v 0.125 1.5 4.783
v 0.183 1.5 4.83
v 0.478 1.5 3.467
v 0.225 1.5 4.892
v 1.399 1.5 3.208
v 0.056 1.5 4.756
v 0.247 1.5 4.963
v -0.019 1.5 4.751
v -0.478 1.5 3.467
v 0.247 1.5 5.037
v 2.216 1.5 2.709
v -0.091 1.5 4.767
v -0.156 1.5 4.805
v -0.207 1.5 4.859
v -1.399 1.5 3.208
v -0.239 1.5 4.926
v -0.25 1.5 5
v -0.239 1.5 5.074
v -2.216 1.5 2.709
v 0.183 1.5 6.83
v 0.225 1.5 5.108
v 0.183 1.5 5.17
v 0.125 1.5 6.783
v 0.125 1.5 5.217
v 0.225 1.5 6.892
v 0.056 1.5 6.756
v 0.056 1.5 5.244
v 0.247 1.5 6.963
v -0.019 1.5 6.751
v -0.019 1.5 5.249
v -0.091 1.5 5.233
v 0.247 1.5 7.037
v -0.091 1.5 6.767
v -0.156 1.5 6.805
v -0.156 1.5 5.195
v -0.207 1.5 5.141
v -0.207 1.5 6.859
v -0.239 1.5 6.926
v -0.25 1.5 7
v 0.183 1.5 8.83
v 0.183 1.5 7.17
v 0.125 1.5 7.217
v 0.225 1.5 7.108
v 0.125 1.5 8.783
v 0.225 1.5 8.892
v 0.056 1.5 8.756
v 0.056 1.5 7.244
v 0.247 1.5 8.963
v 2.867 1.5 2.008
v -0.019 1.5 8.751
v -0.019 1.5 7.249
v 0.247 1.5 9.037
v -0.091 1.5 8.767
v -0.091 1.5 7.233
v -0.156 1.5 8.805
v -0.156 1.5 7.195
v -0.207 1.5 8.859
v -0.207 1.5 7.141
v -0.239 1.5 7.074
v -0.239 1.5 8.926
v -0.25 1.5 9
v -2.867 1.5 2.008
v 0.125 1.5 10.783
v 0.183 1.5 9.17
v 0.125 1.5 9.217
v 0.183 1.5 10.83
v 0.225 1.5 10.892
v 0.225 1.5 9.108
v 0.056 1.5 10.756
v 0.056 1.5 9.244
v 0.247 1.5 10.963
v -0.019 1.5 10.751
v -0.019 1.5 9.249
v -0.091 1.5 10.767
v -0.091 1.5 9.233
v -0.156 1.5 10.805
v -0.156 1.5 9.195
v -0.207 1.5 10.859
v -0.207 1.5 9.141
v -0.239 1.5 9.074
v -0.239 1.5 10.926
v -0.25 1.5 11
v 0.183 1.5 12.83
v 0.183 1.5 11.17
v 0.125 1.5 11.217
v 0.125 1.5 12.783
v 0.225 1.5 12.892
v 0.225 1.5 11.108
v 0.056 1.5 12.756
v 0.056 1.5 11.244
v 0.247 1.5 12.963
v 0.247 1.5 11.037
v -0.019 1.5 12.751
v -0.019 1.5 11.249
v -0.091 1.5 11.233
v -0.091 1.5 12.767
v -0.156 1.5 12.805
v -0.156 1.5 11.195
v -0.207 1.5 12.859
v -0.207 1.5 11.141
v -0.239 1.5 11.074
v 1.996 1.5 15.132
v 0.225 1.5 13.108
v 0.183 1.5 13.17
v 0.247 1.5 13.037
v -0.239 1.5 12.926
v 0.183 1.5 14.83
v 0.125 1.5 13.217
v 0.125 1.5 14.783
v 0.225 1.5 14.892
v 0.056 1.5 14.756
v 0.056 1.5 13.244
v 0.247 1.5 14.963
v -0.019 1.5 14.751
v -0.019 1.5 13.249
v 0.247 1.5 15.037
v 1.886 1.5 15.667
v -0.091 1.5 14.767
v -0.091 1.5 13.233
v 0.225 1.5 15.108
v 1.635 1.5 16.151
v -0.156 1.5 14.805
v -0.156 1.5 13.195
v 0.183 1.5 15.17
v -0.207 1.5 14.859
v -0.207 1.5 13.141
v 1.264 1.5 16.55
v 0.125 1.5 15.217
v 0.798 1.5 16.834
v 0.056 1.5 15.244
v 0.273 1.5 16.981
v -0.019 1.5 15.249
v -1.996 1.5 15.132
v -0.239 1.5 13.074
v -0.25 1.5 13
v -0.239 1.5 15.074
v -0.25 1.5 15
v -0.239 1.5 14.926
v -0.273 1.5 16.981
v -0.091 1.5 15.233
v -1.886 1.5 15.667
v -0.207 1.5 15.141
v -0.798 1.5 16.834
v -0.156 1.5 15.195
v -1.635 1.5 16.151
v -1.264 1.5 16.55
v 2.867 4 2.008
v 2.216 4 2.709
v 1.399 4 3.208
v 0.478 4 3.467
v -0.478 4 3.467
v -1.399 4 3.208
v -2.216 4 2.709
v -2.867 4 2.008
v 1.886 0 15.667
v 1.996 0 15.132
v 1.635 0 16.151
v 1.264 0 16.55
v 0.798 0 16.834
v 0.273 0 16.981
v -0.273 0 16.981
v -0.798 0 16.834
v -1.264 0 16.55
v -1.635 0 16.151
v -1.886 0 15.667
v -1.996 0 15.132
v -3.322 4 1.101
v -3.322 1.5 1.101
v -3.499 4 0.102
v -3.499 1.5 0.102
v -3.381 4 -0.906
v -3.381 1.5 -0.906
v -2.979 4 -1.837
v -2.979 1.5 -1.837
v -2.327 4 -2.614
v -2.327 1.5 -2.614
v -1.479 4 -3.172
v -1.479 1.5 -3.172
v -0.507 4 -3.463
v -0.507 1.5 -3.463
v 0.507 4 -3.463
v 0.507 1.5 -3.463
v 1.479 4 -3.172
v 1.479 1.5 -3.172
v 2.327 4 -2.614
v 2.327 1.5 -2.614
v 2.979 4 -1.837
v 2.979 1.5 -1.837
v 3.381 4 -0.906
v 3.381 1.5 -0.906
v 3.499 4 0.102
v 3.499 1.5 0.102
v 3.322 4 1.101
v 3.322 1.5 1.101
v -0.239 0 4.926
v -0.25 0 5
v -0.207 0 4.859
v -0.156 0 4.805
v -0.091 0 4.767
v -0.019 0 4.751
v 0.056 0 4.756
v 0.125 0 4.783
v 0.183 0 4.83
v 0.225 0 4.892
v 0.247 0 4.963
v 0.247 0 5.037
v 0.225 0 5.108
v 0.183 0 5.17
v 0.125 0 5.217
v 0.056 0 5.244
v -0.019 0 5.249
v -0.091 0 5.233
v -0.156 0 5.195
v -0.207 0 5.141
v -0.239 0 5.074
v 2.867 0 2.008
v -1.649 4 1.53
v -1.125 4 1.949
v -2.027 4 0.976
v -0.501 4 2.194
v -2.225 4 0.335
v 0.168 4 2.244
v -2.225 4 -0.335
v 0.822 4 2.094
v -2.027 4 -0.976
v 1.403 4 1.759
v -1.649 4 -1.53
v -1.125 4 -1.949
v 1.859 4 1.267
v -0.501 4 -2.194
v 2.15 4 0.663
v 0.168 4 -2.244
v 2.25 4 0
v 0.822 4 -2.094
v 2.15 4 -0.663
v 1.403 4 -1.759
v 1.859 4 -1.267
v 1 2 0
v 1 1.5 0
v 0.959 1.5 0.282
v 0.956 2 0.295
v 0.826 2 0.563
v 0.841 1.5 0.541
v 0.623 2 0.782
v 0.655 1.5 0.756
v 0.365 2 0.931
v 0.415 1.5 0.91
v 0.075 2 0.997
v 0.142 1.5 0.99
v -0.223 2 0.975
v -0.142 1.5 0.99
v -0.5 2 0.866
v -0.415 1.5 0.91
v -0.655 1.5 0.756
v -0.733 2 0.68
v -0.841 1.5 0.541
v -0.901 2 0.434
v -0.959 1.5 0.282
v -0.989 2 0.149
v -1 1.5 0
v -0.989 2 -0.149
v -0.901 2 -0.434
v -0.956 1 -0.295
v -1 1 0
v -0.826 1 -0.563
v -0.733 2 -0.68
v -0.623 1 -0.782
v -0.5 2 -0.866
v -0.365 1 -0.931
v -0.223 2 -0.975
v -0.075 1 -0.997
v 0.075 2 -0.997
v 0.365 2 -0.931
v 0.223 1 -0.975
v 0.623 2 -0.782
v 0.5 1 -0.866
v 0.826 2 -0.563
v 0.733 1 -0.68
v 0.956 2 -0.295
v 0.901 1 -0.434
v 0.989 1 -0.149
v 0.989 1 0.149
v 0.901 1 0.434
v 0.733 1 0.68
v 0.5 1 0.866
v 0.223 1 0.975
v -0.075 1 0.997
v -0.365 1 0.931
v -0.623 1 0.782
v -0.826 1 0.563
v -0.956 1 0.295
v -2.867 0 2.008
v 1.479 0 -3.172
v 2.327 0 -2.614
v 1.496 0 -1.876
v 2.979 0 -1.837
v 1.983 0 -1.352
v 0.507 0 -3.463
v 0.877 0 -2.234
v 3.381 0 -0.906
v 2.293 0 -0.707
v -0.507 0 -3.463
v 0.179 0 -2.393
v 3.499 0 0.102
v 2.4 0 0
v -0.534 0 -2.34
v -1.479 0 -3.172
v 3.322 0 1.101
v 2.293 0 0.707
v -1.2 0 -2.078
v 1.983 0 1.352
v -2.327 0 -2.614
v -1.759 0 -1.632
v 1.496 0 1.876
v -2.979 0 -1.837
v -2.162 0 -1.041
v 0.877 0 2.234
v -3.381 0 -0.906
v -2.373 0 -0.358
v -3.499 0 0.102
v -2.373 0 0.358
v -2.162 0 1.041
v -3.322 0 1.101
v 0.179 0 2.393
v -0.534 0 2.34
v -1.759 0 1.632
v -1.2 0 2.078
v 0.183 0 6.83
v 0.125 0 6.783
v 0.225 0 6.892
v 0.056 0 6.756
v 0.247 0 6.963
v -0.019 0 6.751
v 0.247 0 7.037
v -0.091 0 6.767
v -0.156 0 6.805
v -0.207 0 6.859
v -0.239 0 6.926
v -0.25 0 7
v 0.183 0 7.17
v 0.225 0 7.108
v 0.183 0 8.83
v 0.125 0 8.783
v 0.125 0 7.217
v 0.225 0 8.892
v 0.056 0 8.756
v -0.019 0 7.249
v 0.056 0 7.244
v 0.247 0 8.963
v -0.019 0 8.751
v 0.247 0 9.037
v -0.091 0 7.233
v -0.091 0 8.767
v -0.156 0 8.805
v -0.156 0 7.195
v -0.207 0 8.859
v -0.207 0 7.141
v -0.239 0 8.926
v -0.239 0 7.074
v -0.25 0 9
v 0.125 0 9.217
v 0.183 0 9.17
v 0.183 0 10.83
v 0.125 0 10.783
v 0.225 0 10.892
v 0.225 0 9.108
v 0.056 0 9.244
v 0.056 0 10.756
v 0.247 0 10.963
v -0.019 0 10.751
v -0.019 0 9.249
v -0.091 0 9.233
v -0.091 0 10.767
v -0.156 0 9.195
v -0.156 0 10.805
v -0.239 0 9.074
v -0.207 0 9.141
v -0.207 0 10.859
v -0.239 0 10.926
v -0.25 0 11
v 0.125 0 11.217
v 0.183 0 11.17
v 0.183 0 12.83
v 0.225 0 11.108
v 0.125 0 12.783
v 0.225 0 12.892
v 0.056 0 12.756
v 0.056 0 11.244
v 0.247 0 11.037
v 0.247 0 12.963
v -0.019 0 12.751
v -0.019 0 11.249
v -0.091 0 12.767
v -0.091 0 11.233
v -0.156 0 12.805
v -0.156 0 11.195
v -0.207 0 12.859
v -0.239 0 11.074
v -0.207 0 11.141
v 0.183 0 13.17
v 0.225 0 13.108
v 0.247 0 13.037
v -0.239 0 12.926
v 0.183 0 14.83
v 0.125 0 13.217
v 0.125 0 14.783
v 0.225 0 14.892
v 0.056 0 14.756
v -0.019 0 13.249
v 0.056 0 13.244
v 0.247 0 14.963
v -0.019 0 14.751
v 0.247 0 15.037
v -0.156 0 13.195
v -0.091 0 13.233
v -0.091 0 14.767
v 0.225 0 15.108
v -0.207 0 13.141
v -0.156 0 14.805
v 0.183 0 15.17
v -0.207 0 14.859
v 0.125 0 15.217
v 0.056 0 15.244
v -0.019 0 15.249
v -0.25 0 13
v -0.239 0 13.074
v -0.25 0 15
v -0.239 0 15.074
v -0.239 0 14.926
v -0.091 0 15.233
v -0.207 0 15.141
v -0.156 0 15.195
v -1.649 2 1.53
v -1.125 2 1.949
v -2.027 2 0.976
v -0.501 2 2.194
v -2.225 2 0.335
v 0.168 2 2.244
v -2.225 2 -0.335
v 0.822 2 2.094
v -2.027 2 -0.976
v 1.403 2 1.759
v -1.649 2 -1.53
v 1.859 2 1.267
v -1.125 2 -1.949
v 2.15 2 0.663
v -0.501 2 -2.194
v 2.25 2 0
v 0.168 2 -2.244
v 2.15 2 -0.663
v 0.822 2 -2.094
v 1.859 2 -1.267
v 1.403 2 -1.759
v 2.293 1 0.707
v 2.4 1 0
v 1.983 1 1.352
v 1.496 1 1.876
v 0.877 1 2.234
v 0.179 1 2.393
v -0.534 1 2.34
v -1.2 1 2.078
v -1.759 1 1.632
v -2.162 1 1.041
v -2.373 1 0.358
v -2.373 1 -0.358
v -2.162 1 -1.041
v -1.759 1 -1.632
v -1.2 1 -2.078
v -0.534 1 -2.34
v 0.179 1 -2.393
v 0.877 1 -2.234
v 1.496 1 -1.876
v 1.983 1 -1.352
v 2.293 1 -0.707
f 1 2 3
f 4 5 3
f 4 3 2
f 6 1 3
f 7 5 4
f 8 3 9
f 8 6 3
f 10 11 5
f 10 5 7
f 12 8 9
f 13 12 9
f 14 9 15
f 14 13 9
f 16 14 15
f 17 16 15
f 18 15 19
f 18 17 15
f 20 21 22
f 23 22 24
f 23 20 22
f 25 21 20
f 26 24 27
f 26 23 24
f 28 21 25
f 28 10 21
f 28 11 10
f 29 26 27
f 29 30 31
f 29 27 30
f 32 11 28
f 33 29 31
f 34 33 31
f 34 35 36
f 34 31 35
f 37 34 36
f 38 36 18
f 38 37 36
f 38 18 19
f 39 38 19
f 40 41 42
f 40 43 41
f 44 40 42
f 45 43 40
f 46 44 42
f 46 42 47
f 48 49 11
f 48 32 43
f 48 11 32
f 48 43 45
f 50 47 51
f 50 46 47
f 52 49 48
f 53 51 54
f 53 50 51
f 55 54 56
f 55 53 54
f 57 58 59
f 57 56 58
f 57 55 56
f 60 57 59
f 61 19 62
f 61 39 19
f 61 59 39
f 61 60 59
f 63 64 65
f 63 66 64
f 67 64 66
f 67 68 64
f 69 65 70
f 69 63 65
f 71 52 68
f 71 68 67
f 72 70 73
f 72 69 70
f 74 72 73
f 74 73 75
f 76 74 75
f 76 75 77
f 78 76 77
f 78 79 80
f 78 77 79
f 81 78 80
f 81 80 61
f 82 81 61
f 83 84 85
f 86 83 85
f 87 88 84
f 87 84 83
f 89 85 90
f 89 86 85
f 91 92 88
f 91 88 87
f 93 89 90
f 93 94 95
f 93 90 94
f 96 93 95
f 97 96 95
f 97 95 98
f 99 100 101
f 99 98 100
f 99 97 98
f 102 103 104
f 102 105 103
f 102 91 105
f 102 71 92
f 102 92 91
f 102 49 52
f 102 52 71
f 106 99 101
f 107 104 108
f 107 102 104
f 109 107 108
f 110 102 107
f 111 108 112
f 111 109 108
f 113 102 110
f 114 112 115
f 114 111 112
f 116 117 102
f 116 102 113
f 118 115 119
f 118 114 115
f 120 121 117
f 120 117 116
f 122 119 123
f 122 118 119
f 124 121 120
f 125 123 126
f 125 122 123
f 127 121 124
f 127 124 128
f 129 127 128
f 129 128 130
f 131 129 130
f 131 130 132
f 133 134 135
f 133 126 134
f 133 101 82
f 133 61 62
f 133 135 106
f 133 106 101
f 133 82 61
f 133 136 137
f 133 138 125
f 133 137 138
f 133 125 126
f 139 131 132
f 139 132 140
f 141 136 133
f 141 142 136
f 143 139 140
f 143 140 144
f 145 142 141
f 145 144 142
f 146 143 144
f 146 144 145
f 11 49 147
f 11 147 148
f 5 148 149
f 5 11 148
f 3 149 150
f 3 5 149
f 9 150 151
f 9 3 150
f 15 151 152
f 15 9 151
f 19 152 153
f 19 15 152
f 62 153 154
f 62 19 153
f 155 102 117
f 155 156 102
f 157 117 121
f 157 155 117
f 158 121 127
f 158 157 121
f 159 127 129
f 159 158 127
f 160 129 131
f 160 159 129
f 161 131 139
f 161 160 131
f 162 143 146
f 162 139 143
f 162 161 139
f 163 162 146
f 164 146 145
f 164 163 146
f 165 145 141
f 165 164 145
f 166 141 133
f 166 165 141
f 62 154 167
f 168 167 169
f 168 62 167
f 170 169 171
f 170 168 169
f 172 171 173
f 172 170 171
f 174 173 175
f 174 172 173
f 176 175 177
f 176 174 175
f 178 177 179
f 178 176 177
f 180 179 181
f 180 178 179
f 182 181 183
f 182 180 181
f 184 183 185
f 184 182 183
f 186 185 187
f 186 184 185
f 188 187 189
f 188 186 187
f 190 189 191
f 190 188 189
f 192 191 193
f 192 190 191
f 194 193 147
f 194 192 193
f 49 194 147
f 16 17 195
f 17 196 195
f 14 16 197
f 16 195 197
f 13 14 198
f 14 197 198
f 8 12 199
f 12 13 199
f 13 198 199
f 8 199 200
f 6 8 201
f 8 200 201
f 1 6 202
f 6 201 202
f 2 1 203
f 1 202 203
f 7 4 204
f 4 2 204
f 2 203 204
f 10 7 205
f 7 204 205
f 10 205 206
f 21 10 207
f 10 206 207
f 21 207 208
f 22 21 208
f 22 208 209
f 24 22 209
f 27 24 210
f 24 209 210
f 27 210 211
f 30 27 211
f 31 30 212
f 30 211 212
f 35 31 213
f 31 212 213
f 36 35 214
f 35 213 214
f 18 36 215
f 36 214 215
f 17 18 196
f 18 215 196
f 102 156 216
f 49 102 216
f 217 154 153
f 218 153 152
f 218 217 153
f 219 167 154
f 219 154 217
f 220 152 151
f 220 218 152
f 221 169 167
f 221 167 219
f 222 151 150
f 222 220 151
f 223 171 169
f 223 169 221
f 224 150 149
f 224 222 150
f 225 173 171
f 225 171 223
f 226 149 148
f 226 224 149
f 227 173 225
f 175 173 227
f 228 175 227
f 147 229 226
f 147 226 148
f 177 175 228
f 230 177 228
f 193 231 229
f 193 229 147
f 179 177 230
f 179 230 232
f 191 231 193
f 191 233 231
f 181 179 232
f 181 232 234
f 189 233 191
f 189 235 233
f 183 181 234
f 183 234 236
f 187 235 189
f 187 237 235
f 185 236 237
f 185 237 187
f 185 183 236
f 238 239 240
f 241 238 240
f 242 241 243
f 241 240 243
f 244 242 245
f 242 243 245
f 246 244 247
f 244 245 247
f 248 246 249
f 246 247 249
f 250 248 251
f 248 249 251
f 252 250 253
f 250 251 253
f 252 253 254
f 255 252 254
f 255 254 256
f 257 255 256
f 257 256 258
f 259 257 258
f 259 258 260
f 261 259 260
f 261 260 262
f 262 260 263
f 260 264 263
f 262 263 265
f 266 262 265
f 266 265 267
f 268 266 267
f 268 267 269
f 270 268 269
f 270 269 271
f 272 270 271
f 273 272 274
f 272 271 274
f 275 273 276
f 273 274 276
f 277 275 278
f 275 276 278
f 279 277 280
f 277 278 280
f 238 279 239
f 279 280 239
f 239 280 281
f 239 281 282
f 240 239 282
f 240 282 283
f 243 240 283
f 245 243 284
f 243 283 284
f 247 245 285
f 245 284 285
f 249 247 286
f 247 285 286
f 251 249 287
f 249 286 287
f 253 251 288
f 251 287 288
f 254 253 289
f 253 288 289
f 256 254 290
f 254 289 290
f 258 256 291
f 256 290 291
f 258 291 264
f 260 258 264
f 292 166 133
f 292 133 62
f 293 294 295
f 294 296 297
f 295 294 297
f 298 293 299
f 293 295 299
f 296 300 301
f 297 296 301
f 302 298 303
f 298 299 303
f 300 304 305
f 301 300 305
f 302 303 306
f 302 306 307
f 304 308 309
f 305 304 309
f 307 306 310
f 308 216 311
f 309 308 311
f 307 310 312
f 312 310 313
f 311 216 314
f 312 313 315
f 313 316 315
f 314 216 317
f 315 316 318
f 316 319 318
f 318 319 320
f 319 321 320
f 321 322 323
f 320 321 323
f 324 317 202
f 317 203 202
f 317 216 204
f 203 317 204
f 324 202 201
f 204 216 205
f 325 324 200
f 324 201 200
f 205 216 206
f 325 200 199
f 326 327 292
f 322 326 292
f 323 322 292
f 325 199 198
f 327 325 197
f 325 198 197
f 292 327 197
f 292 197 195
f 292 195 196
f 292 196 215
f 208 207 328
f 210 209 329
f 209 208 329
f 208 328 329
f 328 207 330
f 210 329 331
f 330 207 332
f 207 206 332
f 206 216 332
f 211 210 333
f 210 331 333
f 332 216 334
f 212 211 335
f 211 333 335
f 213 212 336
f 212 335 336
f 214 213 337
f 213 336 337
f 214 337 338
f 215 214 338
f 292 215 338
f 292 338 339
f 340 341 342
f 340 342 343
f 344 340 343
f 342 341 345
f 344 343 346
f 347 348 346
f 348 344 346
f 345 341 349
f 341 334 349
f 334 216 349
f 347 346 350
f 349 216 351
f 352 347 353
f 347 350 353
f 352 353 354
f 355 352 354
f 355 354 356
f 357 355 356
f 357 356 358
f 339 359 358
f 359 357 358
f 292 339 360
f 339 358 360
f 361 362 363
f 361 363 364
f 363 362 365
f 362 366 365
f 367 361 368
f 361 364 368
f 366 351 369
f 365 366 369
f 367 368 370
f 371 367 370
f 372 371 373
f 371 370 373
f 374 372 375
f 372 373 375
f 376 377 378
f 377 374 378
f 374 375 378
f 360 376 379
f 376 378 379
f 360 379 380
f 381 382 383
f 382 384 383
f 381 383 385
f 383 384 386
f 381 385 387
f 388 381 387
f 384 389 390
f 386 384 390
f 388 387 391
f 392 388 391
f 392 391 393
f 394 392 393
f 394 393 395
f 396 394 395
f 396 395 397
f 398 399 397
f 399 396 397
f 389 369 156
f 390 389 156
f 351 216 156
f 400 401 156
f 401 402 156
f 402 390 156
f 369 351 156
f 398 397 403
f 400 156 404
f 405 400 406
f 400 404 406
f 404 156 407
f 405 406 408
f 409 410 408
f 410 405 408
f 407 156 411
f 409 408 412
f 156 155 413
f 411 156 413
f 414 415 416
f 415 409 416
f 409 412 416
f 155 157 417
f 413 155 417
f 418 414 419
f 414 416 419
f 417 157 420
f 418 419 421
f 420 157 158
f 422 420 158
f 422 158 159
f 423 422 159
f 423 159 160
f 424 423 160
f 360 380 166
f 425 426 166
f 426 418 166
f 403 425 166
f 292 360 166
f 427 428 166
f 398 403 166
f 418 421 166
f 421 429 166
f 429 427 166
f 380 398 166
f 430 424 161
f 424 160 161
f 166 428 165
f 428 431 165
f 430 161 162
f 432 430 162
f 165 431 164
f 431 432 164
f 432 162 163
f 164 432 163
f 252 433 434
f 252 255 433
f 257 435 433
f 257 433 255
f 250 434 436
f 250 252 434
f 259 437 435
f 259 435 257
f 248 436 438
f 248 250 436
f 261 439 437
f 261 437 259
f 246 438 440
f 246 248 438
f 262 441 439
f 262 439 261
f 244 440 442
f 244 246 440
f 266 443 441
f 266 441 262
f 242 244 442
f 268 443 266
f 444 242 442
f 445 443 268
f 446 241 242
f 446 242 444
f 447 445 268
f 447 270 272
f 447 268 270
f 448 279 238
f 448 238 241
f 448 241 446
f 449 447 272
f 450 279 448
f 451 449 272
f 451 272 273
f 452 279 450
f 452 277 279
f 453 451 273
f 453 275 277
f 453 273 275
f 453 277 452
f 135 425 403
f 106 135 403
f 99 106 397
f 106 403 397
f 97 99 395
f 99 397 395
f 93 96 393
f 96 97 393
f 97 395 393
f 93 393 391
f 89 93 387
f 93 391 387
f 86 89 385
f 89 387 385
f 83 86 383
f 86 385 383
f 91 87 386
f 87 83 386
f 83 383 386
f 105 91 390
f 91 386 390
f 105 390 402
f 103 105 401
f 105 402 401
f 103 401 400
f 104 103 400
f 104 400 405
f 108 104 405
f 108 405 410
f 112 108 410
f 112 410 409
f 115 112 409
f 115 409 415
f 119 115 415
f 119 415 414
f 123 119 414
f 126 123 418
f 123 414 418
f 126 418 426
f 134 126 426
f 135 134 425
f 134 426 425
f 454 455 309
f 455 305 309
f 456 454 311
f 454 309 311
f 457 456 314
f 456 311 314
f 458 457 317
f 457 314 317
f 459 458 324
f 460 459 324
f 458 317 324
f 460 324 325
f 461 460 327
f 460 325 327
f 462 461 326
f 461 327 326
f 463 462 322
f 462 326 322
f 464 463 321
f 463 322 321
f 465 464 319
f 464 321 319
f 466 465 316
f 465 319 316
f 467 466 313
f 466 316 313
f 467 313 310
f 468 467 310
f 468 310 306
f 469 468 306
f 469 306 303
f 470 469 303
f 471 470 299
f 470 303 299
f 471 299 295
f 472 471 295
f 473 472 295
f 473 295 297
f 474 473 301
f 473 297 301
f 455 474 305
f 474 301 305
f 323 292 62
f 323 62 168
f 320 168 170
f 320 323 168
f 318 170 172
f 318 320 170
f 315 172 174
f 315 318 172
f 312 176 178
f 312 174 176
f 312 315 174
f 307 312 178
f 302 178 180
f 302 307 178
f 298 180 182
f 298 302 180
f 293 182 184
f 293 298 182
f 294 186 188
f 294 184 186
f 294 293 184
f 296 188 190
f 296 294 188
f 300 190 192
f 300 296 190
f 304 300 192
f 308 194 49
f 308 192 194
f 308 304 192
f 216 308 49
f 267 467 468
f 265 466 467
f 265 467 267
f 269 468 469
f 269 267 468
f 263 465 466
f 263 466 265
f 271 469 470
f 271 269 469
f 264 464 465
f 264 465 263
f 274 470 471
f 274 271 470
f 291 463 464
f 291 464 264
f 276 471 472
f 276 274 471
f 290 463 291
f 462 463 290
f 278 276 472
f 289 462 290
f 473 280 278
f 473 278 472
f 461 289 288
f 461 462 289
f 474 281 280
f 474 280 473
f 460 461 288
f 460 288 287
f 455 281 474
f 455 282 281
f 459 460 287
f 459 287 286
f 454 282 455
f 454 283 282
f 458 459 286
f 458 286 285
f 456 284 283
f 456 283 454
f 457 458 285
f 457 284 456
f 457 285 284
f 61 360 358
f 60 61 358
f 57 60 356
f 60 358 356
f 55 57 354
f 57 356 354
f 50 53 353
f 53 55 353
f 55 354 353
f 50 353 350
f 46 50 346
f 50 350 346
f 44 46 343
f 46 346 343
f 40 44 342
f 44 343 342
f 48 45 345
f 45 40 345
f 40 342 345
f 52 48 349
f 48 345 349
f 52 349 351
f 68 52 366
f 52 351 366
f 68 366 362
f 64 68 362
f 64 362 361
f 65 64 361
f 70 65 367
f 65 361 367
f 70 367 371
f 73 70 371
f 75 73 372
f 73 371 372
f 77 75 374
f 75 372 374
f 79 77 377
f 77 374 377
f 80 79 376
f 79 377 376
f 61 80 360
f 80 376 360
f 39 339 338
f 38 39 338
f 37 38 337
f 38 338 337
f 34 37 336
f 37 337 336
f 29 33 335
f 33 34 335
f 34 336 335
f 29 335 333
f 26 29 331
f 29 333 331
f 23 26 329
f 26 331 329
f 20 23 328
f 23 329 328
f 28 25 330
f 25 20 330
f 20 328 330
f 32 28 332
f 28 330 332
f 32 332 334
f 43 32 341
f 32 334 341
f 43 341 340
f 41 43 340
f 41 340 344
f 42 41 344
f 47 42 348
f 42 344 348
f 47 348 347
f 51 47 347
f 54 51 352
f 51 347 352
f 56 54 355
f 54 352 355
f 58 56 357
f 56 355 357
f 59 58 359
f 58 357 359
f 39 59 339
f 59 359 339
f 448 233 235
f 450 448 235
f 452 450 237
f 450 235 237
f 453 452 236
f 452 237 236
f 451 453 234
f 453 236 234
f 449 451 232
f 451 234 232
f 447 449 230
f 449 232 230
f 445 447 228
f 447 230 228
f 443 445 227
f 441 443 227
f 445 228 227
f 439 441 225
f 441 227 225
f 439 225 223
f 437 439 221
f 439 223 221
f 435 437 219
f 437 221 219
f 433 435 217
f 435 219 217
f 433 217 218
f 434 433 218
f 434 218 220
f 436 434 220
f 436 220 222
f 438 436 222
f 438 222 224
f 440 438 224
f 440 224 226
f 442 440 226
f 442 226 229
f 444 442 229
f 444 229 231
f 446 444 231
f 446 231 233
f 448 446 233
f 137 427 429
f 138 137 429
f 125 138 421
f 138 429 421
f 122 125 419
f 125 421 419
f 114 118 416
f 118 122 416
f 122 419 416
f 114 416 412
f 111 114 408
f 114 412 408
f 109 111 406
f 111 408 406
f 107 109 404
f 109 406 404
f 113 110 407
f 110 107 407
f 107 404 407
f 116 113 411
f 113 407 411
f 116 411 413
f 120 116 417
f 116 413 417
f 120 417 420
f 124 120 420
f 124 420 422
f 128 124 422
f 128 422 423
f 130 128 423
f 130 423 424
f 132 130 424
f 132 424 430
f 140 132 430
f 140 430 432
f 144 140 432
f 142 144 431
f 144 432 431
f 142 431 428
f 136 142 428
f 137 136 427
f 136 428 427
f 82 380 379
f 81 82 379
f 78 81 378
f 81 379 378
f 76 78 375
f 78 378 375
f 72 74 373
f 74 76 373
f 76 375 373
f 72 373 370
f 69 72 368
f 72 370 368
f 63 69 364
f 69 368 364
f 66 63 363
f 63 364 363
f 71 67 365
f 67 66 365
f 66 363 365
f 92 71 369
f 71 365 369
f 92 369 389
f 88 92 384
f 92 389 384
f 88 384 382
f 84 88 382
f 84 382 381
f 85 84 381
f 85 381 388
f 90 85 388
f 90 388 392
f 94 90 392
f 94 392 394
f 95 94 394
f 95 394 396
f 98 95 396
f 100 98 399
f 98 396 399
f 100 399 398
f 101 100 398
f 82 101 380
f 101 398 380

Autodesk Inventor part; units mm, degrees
ref_plane "YZ Plane" through (0, 0, 0) normal (1, 0, 0) x (0, 1, 0)
ref_plane "XZ Plane" through (0, 0, 0) normal (0, 1, 0) x (-1, 0, 0)
ref_plane "XY Plane" through (0, 0, 0) normal (0, 0, 1) x (1, 0, 0)
sketch "Эскиз1" plane through (0, 0, 0) normal (0, 1, 0) x (-1, 0, 0)
  circle A0 centre (0, 0) radius 1
  circle A1 centre (0, 0) radius 3.5
  arc A2 (1.9956, 15.1325) -> (-1.9956, 15.1325) centre (0, 15) ccw
  line L0 (1.9956, 15.1325) -> (2.8667, 2.008)
  line L1 (-1.9956, 15.1325) -> (-2.8667, 2.008)
  circle A3 centre (0, 15) radius 0.25
  circle A4 centre (0, 13) radius 0.25
  circle A5 centre (0, 11) radius 0.25
  circle A6 centre (0, 9) radius 0.25
  circle A7 centre (0, 7) radius 0.25
  circle A8 centre (0, 5) radius 0.25
  line L2 (2.8667, 2.008) -> (3, 0) construction
  line L3 (-2.8667, 2.008) -> (-3, 0) construction
  dimension "d0" = 7
  dimension "d1" = 2
  dimension "d2" = 3
  dimension "d3" = 3
  dimension "d4" = 15
  dimension "d5" = 2
  dimension "d6" = 0.5
  dimension "d7" = 0.5
  dimension "d8" = 0.5
  dimension "d9" = 0.5
  dimension "d10" = 0.5
  dimension "d11" = 0.5
  dimension "d13" = 2
  dimension "d14" = 2
  dimension "d15" = 2
  dimension "d16" = 2
  dimension "d17" = 2
extrude "Выдавливание1" add sketch "Эскиз1" along normal blind 1.5
sketch "Эскиз2" plane through (0, 1.5, 0) normal (0, 1, 0) x (1, 0, 0)
  arc A0 (2.8667, -2.008) -> (-2.8667, -2.008) centre (0, 0) ccw projected
  circle A1 centre (0, 0) radius 1 projected
  circle A2 centre (0, 0) radius 3.5
extrude "Выдавливание2" add sketch "Эскиз2" along normal blind 2.5
sketch "Эскиз3" plane through (0, 4, 0) normal (0, 1, 0) x (1, 0, 0)
  circle A0 centre (0, 0) radius 1 projected
  circle A1 centre (0, 0) radius 2.25
  dimension "d23" = 4.5
extrude "Выдавливание3" cut sketch "Эскиз3" against normal blind 2
sketch "Эскиз4" plane through (0, 0, 0) normal (0, -1, 0) x (1, 0, 0)
  circle A0 centre (0, 0) radius 2.4
  dimension "d29" = 4.8
extrude "Выдавливание4" cut sketch "Эскиз4" against normal blind 1
equation "\"d7\" = d6"
equation "\"d8\" = d6"
equation "\"d9\" = d6"
equation "\"d10\" = d6"
equation "\"d11\" = d6"
properties part number "Arm 1" material "Нейлон 6/6"
